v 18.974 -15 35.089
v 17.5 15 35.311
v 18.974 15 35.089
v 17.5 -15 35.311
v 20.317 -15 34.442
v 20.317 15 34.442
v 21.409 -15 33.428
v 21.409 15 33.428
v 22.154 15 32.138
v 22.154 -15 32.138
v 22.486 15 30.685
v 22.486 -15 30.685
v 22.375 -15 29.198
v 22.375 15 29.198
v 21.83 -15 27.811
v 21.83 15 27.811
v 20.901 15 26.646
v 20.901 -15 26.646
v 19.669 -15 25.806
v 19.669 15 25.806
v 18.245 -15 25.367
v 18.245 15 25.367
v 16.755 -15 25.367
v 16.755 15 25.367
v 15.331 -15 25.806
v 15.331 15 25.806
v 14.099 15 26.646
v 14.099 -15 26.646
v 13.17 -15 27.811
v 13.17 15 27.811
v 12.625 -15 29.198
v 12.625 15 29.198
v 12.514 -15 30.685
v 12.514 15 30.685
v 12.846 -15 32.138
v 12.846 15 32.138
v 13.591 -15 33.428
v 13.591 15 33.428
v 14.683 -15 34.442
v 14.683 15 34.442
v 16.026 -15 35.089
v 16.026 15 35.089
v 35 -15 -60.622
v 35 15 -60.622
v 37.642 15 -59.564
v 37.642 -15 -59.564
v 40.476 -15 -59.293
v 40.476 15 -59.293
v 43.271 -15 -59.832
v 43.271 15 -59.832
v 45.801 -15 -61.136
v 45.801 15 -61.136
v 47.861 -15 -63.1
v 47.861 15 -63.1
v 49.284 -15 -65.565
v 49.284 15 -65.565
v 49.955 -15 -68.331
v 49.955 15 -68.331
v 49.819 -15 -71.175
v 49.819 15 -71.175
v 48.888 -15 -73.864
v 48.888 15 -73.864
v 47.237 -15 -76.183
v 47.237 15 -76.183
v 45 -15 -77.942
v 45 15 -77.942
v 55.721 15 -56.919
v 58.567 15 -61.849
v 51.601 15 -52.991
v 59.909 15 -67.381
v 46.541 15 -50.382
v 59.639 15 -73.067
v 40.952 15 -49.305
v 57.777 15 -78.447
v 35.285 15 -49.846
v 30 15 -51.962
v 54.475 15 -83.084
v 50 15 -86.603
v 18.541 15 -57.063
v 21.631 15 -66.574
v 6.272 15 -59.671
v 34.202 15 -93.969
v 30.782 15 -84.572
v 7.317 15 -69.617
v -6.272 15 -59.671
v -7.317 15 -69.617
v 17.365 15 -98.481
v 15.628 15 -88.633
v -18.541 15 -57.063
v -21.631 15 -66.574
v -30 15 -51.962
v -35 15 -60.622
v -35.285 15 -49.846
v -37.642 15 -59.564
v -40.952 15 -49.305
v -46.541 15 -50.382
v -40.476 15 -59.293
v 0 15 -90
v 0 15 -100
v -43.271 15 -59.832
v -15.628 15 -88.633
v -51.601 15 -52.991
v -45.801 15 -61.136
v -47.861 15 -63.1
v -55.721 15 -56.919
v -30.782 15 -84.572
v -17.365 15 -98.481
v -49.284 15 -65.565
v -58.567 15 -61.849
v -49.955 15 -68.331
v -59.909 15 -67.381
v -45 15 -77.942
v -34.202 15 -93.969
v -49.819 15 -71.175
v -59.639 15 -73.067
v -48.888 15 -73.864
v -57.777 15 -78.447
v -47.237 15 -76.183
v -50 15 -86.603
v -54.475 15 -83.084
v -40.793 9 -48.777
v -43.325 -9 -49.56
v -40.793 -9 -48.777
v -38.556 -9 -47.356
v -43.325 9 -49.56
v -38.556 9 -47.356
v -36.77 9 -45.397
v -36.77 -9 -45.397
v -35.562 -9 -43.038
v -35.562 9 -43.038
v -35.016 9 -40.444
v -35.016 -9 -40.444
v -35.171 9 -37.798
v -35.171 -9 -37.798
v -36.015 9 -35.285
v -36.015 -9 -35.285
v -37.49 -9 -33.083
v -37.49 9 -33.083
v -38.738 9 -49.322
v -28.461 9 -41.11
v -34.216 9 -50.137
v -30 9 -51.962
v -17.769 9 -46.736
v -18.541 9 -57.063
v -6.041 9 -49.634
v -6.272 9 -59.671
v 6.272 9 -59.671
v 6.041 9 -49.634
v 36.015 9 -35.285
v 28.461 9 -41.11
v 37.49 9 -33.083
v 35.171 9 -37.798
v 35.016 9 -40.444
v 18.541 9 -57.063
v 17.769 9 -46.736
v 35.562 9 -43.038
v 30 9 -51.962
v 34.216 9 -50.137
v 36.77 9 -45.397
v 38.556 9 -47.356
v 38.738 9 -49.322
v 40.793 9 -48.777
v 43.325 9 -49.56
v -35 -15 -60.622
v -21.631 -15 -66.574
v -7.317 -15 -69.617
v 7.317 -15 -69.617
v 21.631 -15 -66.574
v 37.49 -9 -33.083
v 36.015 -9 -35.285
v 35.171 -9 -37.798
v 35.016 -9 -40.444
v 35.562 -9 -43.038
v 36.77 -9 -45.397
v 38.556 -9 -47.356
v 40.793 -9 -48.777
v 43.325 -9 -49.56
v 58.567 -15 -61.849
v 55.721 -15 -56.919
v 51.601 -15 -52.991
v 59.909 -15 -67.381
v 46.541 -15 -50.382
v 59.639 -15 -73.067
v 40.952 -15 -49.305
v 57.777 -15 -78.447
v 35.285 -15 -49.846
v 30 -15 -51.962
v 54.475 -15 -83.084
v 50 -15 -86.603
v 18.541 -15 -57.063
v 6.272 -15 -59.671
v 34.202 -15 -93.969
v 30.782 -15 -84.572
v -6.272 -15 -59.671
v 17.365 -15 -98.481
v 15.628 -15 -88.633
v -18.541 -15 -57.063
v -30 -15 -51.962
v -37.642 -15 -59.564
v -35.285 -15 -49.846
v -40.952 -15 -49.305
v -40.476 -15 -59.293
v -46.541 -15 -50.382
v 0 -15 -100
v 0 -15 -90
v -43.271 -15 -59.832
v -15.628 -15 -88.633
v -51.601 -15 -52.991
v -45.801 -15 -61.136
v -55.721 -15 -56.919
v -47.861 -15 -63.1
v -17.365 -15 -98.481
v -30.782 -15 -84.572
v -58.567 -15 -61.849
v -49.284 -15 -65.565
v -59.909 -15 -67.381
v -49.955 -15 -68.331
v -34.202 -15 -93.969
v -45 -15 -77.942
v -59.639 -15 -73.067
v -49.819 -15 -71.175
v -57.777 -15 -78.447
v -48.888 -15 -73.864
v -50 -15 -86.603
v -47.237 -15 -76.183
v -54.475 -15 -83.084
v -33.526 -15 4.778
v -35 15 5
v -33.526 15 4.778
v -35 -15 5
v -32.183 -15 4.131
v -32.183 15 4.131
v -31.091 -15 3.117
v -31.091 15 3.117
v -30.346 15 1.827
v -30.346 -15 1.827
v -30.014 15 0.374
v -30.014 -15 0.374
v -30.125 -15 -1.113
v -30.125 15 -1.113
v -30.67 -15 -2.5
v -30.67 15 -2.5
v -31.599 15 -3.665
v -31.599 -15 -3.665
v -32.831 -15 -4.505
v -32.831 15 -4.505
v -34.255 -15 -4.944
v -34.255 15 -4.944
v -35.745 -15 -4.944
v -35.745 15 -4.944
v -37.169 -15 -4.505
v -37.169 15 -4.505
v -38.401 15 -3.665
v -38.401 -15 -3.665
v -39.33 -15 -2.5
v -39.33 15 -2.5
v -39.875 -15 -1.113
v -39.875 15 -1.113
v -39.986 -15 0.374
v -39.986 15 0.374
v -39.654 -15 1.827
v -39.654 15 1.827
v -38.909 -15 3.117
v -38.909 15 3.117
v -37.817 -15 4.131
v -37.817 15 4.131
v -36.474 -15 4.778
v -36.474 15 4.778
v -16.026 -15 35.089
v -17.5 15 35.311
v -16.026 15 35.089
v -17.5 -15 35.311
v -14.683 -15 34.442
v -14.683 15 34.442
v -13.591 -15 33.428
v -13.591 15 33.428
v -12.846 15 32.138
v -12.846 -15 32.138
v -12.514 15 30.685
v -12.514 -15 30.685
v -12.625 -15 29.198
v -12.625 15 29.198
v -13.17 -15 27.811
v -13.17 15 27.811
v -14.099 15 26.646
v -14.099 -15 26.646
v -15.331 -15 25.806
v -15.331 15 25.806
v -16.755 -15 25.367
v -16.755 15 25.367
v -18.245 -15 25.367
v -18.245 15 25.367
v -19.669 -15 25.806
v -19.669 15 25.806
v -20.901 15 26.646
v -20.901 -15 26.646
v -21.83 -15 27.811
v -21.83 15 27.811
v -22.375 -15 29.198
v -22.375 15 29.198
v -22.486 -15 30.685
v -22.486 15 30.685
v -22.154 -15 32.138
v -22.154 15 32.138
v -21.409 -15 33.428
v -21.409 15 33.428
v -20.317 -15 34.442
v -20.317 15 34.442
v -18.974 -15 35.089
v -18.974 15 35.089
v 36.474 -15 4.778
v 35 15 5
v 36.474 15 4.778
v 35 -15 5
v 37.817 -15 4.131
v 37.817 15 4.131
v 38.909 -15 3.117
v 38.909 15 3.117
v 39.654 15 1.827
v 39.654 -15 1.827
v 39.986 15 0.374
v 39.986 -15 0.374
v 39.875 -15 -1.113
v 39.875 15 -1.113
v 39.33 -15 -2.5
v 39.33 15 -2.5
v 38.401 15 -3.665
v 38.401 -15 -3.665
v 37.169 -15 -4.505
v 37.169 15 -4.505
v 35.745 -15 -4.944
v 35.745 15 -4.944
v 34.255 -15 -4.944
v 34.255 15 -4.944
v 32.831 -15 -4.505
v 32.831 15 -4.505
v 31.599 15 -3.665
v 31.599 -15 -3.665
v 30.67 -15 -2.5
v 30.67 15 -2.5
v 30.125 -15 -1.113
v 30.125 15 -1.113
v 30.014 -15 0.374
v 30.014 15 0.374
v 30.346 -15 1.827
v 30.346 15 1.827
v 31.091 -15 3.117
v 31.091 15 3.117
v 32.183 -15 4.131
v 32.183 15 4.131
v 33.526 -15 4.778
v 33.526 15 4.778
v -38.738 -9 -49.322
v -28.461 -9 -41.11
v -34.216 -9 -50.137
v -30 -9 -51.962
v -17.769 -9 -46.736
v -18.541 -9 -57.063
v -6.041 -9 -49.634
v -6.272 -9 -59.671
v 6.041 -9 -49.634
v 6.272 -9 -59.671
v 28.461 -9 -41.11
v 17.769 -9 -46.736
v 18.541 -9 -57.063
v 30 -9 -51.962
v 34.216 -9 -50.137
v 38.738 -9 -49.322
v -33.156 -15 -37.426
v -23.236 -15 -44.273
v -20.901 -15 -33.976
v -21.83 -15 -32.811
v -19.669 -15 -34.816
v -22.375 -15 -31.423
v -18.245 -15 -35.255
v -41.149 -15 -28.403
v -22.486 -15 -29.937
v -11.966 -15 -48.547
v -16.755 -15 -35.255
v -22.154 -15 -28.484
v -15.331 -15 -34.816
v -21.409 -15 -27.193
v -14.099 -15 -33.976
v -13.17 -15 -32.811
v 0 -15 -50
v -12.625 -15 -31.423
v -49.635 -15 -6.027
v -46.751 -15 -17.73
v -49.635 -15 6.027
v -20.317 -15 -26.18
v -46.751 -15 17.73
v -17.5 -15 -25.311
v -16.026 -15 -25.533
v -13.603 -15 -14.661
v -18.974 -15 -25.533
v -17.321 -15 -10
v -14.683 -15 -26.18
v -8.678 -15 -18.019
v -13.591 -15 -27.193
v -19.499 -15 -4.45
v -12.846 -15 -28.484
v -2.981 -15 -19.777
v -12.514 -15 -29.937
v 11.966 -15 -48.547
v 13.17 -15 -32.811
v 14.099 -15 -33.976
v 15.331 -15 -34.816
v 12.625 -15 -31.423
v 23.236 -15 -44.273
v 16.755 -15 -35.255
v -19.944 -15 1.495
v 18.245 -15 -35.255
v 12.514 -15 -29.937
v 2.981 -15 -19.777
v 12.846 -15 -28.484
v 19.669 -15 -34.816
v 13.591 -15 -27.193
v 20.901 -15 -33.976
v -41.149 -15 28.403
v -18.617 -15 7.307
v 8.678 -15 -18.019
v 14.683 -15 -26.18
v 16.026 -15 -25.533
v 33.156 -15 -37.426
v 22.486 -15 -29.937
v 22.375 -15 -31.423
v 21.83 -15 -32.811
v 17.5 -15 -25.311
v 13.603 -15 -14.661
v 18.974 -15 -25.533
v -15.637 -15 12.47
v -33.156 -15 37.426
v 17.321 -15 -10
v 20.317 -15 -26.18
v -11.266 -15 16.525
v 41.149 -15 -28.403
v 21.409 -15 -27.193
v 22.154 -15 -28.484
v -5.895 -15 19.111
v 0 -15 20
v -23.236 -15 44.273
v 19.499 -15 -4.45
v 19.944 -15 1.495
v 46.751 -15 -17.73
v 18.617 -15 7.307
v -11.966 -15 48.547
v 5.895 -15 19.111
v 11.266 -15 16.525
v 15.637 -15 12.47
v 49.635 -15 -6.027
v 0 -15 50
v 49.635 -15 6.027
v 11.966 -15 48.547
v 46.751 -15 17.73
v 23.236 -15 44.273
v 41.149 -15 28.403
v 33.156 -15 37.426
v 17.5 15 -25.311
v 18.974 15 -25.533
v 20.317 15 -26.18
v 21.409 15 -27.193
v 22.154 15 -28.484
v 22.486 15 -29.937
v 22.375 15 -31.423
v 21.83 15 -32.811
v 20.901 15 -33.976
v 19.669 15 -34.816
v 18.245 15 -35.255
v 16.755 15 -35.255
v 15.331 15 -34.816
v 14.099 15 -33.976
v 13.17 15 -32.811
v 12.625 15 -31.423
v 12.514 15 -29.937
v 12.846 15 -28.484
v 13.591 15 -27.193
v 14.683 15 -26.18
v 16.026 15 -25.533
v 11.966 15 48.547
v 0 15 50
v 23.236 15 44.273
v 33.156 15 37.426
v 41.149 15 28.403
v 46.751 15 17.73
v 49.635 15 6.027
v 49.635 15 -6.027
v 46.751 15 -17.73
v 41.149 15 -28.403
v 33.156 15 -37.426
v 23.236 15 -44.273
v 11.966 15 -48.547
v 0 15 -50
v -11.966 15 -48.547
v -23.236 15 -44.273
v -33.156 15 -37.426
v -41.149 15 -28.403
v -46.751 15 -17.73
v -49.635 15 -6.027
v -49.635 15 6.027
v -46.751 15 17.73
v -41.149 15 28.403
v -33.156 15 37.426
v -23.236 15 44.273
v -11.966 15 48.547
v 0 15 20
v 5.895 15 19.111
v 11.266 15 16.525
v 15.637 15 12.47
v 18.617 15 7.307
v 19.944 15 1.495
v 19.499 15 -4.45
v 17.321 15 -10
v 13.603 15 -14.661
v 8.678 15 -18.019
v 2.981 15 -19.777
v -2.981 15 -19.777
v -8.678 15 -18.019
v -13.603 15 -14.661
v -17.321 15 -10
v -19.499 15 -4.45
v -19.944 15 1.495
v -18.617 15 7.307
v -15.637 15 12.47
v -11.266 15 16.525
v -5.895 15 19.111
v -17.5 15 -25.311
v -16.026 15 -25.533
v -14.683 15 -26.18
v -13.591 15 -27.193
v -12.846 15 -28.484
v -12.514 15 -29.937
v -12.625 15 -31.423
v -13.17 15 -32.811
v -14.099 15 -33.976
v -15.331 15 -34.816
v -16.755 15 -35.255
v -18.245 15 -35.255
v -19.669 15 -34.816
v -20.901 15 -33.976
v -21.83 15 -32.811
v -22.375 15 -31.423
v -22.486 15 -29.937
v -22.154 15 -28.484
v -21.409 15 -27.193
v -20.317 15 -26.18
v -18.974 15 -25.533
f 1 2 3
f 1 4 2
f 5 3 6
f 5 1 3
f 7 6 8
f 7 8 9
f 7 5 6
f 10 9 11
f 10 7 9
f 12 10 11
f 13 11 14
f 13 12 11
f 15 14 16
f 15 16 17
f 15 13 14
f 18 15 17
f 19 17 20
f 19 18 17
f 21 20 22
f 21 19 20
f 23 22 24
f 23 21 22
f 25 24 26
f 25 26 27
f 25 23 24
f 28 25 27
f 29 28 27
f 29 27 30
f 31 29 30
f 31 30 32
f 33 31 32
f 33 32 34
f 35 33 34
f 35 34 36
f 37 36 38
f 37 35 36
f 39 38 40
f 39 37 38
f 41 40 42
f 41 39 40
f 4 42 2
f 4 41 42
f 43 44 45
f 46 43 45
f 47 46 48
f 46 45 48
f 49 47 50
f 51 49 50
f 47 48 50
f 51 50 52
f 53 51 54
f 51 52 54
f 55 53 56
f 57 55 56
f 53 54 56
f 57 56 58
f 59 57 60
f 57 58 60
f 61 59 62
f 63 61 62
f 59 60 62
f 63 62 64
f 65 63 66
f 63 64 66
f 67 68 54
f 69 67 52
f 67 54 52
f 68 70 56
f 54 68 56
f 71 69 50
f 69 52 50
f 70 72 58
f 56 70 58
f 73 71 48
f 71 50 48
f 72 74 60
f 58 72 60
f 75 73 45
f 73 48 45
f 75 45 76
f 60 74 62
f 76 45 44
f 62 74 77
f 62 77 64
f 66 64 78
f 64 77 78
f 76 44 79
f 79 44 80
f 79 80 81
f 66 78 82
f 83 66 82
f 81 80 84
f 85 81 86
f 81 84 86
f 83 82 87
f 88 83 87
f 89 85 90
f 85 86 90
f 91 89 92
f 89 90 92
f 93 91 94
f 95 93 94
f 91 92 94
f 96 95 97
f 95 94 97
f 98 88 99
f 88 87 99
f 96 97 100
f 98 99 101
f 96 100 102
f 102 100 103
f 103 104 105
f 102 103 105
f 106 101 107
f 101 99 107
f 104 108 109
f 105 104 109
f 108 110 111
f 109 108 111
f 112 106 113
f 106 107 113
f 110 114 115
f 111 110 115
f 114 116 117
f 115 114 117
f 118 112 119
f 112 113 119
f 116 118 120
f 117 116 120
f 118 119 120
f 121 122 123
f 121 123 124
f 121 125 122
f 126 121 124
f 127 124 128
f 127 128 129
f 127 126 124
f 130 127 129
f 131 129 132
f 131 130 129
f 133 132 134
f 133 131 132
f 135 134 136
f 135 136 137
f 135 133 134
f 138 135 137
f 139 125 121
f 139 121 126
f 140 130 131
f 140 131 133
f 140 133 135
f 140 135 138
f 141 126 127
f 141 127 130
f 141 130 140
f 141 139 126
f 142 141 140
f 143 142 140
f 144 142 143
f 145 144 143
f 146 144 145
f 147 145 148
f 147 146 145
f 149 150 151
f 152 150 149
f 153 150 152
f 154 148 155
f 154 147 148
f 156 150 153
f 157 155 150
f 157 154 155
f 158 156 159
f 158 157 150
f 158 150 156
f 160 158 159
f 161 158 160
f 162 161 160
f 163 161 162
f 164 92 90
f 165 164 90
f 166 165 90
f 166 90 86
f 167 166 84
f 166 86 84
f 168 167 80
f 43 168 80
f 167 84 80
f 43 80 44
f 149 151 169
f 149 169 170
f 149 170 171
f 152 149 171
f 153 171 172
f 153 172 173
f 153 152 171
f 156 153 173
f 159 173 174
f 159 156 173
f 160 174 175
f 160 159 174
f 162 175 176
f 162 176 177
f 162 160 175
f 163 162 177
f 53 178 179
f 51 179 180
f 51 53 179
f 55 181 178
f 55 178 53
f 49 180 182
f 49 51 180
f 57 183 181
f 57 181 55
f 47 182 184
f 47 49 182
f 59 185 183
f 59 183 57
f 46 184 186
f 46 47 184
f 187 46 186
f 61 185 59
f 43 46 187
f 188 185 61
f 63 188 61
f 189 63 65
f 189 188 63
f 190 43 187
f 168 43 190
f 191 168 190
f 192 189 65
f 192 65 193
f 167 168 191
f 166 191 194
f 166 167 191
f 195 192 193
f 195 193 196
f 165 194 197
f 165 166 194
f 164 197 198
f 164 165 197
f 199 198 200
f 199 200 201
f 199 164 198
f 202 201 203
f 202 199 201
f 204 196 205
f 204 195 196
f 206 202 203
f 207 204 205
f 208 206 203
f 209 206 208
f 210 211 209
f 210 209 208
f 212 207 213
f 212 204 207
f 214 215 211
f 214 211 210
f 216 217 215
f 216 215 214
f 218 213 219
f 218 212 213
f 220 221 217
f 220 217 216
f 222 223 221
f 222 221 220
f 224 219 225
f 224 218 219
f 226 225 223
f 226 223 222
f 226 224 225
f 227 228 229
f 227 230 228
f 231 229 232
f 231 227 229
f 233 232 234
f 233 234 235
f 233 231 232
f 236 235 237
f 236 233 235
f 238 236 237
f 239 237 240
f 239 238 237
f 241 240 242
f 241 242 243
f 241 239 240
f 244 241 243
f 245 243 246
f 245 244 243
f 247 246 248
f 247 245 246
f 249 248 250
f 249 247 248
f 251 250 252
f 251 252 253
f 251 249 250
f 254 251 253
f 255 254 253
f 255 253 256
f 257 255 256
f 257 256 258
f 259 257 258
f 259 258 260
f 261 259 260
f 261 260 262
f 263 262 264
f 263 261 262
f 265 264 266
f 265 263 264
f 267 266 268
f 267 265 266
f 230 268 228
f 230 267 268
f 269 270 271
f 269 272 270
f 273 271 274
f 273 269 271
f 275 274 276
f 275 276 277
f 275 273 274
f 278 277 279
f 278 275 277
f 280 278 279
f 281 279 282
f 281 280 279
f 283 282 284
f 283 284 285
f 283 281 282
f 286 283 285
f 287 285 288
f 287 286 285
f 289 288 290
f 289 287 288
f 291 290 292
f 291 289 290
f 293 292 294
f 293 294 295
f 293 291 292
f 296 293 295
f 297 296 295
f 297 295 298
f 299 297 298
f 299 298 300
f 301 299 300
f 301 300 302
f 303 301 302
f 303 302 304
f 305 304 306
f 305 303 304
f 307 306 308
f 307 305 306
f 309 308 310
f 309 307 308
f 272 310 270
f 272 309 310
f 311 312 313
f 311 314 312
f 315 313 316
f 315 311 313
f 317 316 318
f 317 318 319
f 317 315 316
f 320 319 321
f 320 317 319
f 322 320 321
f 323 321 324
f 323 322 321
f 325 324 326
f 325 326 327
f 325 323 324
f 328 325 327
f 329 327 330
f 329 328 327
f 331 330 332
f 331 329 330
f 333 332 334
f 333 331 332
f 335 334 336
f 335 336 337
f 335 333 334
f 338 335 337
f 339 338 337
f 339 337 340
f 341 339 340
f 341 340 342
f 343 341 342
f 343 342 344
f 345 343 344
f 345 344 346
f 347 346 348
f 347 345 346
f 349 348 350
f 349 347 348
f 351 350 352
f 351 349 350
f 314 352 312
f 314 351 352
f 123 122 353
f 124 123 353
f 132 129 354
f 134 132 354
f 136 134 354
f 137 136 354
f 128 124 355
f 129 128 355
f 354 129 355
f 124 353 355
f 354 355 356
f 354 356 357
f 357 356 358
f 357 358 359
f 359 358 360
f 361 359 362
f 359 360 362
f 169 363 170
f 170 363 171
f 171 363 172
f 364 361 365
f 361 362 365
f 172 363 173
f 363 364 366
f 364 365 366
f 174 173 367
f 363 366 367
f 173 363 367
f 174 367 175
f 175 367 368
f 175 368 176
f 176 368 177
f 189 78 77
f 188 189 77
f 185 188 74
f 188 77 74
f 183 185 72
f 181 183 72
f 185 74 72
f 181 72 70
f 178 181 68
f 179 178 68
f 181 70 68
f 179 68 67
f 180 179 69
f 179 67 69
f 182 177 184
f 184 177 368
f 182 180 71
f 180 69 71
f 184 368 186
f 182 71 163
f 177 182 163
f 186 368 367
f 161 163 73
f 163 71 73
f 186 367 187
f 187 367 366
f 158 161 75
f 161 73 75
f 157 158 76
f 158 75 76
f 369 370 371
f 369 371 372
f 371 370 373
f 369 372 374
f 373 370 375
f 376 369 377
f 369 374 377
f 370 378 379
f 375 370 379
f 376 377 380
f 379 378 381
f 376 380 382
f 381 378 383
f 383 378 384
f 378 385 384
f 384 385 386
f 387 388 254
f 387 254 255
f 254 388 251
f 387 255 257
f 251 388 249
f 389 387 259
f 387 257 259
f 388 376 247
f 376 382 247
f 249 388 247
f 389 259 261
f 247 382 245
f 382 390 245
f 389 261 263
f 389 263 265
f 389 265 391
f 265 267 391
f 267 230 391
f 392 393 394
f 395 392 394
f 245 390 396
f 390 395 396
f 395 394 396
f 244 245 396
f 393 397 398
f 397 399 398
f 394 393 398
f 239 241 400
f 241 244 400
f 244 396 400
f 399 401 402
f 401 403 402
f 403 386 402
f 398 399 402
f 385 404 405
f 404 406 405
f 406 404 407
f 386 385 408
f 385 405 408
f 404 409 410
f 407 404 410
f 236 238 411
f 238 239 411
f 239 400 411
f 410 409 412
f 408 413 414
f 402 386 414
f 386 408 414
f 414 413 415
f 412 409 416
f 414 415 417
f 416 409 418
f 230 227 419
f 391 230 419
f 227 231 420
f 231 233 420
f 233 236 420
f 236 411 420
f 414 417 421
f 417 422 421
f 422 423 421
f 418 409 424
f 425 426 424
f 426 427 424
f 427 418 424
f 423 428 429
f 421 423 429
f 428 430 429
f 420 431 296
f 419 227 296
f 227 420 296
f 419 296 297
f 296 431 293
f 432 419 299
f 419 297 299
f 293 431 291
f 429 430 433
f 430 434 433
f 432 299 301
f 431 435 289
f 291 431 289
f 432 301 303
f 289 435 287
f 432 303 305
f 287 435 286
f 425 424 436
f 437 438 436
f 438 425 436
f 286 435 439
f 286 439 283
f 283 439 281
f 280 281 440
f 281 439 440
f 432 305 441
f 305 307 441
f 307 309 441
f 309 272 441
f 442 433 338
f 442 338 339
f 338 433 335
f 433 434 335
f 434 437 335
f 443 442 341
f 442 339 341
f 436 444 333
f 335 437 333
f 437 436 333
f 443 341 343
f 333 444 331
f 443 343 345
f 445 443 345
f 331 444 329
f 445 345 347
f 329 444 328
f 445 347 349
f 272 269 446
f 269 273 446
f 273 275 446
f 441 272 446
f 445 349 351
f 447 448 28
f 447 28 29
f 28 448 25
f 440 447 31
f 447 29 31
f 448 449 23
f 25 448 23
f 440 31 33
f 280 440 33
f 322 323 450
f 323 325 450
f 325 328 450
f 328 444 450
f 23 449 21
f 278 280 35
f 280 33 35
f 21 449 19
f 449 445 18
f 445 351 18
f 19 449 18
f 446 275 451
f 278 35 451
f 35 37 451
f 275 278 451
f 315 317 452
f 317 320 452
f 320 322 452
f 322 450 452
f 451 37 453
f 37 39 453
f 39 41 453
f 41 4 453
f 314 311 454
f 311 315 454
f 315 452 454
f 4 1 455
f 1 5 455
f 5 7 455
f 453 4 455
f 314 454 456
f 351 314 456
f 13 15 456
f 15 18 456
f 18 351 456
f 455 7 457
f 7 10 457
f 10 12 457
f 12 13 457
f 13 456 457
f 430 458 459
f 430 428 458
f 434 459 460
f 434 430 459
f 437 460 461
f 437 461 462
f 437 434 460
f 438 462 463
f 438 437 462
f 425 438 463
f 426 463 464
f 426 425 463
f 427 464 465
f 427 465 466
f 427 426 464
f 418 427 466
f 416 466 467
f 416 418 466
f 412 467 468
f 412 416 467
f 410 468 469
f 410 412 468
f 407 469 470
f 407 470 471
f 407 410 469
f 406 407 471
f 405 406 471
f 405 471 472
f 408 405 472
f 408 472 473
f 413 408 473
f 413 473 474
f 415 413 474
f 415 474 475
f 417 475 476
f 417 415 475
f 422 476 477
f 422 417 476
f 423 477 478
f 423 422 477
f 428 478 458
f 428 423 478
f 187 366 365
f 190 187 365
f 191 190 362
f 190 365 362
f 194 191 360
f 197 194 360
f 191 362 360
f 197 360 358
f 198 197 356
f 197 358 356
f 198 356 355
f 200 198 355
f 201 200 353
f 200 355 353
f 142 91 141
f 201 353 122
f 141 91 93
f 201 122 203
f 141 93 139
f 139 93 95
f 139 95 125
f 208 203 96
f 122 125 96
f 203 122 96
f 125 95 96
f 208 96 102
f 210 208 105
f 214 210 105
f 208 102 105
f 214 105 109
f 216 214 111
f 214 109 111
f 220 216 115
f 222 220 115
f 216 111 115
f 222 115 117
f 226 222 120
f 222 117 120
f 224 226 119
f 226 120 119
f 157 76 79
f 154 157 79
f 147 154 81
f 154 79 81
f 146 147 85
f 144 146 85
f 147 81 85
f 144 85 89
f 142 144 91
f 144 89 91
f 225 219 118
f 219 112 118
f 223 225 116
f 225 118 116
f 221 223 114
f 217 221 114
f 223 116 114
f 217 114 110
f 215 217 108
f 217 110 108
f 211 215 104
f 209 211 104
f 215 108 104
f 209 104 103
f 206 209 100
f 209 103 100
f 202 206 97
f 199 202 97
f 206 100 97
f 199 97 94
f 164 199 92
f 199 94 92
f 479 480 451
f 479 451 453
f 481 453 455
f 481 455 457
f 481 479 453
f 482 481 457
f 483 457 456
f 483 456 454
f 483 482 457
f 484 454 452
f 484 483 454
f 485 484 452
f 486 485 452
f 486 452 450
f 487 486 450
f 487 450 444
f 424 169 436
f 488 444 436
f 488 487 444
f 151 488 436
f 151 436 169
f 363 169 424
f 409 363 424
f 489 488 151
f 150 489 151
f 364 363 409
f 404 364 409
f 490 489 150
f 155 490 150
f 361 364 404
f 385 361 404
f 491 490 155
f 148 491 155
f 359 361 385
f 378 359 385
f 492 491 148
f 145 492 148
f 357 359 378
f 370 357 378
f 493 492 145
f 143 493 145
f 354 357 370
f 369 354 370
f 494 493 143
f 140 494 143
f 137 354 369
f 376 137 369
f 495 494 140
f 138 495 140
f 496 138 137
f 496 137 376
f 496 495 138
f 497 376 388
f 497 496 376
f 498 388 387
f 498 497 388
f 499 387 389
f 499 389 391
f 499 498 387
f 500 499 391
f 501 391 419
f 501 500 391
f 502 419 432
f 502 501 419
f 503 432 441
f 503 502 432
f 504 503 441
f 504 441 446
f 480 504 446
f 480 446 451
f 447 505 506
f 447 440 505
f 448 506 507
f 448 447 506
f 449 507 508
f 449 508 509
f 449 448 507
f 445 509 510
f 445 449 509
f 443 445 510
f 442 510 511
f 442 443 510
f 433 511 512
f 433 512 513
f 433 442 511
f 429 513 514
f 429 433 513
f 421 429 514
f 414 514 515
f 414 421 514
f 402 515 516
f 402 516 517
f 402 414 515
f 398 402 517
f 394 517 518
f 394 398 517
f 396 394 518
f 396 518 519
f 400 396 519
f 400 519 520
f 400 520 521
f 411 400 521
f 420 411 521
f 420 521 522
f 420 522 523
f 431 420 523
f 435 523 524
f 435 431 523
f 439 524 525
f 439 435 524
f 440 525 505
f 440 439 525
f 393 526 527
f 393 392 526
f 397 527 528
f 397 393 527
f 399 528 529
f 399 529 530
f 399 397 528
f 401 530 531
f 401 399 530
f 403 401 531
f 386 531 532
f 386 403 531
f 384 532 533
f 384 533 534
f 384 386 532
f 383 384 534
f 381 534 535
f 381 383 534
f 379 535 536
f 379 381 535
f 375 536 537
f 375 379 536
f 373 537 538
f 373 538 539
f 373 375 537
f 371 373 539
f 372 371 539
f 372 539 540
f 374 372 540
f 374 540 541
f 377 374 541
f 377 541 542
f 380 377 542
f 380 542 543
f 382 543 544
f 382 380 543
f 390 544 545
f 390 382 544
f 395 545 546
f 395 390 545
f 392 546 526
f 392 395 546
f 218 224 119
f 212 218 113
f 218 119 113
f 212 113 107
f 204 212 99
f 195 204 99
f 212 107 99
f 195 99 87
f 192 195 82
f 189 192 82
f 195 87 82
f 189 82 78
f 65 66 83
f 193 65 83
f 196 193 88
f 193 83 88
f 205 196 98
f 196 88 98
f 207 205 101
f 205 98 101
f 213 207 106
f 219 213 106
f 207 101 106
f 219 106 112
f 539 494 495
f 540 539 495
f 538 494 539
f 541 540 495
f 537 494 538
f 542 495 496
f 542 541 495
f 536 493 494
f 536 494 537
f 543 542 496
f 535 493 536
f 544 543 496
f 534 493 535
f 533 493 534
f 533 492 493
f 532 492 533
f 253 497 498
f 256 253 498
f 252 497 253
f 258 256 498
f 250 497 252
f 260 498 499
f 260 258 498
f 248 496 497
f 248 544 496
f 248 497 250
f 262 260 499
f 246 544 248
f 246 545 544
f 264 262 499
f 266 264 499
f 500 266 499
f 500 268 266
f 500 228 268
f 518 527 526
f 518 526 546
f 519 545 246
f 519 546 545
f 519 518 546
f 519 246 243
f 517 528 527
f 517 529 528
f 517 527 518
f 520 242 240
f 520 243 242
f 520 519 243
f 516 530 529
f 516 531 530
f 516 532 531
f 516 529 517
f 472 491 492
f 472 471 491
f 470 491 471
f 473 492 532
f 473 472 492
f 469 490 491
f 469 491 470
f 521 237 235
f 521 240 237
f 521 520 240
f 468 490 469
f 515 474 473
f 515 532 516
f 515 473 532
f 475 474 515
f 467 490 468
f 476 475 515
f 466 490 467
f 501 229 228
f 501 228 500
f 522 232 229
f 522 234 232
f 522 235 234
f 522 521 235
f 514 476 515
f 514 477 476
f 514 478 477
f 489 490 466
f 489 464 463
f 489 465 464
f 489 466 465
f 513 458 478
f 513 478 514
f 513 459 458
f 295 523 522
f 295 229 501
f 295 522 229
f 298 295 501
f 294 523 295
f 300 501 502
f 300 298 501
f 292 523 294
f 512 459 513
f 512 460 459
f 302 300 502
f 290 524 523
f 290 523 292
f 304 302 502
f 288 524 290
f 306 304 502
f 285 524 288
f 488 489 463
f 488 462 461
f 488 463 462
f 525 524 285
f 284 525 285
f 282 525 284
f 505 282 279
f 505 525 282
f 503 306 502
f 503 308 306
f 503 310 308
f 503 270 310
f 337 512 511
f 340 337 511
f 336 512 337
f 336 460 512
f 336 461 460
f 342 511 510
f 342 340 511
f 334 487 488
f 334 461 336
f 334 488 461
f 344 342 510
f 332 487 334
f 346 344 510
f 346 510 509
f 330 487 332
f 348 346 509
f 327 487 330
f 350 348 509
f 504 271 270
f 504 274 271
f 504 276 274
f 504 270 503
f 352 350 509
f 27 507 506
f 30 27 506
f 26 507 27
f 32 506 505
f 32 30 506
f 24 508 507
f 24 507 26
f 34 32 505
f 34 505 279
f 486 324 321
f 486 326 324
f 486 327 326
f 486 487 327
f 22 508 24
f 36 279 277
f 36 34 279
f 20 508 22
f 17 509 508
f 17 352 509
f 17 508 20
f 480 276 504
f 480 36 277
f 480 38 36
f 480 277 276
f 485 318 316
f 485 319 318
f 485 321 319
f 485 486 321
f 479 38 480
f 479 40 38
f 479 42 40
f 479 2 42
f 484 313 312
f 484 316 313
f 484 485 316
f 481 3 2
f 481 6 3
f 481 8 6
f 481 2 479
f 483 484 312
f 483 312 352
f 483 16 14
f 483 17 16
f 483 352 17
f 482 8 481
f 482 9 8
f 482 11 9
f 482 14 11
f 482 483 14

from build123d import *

# Parameters (mm, degrees)
SKETCH1_R             = 50
SKETCH1_R_2           = 5
SKETCH1_R_3           = 20
BOSS_EXTRUDE1_DEPTH   = 15
BOSS_EXTRUDE1_2_DEPTH = 15
BOSS_EXTRUDE2_DEPTH   = 9


with BuildPart() as part:
    # Sketch1 → Boss-Extrude1 (new, symmetric)
    with BuildSketch(Plane(origin=(0, 0, 0), x_dir=(1, 0, 0), z_dir=(0, 1, 0))):
        Circle(SKETCH1_R)
        with Locations((-17.5, -30.310889132)):
            Circle(SKETCH1_R_2, mode=Mode.SUBTRACT)
        with Locations((-35, 0)):
            Circle(SKETCH1_R_2, mode=Mode.SUBTRACT)
        Circle(SKETCH1_R_3, mode=Mode.SUBTRACT)
        with Locations((17.5, -30.310889132)):
            Circle(SKETCH1_R_2, mode=Mode.SUBTRACT)
        with Locations((35, 0)):
            Circle(SKETCH1_R_2, mode=Mode.SUBTRACT)
        with Locations((-17.5, 30.310889132)):
            Circle(SKETCH1_R_2, mode=Mode.SUBTRACT)
        with Locations((17.5, 30.310889132)):
            Circle(SKETCH1_R_2, mode=Mode.SUBTRACT)
    extrude(amount=BOSS_EXTRUDE1_DEPTH, both=True)



with BuildPart() as body_2:
    # Sketch1 → Boss-Extrude1 2 (new, symmetric)
    with BuildSketch(Plane(origin=(0, 0, 0), x_dir=(1, 0, 0), z_dir=(0, 1, 0))):
        with BuildLine():
            ThreePointArc((30, 51.961524227), (57.320508076, 59.282032303), (50, 86.602540378))
            ThreePointArc((50, 86.602540378), (0, 100), (-50, 86.602540378))
            ThreePointArc((-50, 86.602540378), (-57.320508076, 59.282032303), (-30, 51.961524227))
            ThreePointArc((-30, 51.961524227), (0, 60), (30, 51.961524227))
        make_face()
        with BuildLine():
            ThreePointArc((-45, 77.942286341), (0, 90), (45, 77.942286341))
            ThreePointArc((45, 77.942286341), (48.660254038, 64.282032303), (35, 60.621778265))
            ThreePointArc((35, 60.621778265), (0, 70), (-35, 60.621778265))
            ThreePointArc((-35, 60.621778265), (-48.660254038, 64.282032303), (-45, 77.942286341))
        make_face(mode=Mode.SUBTRACT)
    extrude(amount=BOSS_EXTRUDE1_2_DEPTH, both=True)


with BuildPart() as part_1:
    add(part.part)

    add(body_2.part)  # Boss-Extrude2 merges body 2
    # Sketch1<3> → Boss-Extrude2 (add, symmetric)
    with BuildSketch(Plane(origin=(0, 0, 0), x_dir=(1, 0, 0), z_dir=(0, 1, 0))):
        with BuildLine():
            ThreePointArc((-37.490169455, 33.08303484), (0, 50), (37.490169455, 33.08303484))
            ThreePointArc((37.490169455, 33.08303484), (35.561850492, 43.037885637), (43.325468897, 49.56043864))
            ThreePointArc((43.325468897, 49.56043864), (36.453361541, 49.599010288), (30, 51.961524227))
            ThreePointArc((30, 51.961524227), (0, 60), (-30, 51.961524227))
            ThreePointArc((-30, 51.961524227), (-36.453361541, 49.599010288), (-43.325468897, 49.56043864))
            ThreePointArc((-43.325468897, 49.56043864), (-35.561850492, 43.037885637), (-37.490169455, 33.08303484))
        make_face()
    extrude(amount=BOSS_EXTRUDE2_DEPTH, both=True)


solid = part_1.part
